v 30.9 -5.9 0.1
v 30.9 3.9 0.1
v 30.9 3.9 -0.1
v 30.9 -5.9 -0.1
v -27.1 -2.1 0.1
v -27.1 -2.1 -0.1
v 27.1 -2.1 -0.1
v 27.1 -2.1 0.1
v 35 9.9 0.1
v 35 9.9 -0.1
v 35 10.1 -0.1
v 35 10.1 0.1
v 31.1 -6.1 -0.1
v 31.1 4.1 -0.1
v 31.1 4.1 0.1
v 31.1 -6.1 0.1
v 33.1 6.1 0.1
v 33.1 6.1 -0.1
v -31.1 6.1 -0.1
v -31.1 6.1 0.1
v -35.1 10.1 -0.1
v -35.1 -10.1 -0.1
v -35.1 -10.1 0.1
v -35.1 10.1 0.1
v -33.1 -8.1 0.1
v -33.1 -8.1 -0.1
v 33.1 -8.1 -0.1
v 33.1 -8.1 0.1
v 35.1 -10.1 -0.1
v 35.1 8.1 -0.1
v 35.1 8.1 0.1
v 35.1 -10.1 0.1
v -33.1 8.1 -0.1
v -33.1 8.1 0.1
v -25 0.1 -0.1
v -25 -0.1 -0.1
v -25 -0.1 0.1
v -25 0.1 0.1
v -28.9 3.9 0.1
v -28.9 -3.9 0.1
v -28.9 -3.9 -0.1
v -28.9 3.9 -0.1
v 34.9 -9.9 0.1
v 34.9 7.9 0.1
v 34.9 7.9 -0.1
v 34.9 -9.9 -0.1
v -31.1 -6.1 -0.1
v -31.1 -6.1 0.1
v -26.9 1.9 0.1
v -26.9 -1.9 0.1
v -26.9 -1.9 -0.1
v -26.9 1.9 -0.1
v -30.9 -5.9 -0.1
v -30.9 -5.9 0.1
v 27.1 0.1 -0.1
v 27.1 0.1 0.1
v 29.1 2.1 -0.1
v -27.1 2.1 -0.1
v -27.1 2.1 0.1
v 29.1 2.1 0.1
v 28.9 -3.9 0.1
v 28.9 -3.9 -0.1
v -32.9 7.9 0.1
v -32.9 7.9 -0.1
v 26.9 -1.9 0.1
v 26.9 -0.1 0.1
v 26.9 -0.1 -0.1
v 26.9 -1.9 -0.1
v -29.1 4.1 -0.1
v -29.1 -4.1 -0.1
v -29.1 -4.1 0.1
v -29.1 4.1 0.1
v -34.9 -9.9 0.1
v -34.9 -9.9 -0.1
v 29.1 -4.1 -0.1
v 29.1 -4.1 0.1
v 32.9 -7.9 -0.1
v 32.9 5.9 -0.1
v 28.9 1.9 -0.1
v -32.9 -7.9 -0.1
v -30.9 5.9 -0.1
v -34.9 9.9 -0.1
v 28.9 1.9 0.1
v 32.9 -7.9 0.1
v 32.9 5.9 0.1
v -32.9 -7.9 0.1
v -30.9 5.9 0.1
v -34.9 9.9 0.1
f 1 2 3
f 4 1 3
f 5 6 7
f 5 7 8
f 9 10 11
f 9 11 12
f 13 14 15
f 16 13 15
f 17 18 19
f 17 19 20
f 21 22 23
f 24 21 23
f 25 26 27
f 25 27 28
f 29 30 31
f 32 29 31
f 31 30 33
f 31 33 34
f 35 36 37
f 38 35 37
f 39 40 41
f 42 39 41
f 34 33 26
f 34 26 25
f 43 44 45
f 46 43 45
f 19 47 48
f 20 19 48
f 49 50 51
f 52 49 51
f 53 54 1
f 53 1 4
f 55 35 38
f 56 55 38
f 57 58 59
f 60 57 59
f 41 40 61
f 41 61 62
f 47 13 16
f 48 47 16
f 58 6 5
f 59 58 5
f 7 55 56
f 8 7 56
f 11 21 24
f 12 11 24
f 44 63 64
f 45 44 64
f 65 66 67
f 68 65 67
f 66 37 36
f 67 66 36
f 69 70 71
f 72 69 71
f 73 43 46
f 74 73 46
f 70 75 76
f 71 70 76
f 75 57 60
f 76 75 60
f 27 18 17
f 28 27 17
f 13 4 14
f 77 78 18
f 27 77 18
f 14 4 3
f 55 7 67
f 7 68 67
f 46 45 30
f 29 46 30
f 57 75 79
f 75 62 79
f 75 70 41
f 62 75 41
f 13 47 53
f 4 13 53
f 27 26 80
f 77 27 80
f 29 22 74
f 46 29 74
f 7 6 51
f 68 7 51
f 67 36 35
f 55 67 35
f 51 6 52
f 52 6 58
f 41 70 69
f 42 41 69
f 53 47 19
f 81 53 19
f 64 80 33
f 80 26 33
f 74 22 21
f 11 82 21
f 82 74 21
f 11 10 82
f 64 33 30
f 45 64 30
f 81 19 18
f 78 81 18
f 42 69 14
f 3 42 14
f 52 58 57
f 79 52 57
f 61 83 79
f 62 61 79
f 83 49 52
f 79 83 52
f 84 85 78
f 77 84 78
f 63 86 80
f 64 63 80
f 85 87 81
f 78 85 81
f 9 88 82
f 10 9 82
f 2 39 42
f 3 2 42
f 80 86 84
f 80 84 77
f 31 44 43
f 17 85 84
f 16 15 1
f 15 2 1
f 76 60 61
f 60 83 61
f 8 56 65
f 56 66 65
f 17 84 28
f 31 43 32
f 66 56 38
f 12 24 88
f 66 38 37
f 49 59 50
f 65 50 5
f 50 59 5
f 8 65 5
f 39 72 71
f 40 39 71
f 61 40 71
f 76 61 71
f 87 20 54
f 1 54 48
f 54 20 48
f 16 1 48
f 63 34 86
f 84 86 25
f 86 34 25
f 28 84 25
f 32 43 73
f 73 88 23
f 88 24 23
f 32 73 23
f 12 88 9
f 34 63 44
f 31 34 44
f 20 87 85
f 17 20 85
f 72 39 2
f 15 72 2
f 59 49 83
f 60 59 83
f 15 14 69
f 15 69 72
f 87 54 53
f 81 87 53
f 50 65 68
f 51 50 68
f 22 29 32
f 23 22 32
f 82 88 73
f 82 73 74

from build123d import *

# Parameters (mm, degrees)
SKETCH4_W = 0.2
SKETCH4_H = 0.2


with BuildPart() as part:
    # Sweep2: sweep along a path in Sketch3
    with BuildLine(Plane.XY) as sweep2_path:
        Line((35, 10), (-35, 10))
        Line((-35, 10), (-35, -10))
        Line((-35, -10), (35, -10))
        Line((35, -10), (35, 8))
        Line((35, 8), (-33, 8))
        Line((-33, 8), (-33, -8))
        Line((-33, -8), (33, -8))
        Line((33, -8), (33, 6))
        Line((33, 6), (-31, 6))
        Line((-31, 6), (-31, -6))
        Line((-31, -6), (31, -6))
        Line((31, -6), (31, 4))
        Line((31, 4), (-29, 4))
        Line((-29, 4), (-29, -4))
        Line((-29, -4), (29, -4))
        Line((29, -4), (29, 2))
        Line((29, 2), (-27, 2))
        Line((-27, 2), (-27, -2))
        Line((-27, -2), (27, -2))
        Line((27, -2), (27, 0))
        Line((27, 0), (-25, 0))
    # Sketch4 → Sweep2 (sweep)
    with BuildSketch(Plane(origin=(0, 0, 0), x_dir=(0, 0, -1), z_dir=(1, 0, 0))):
        Rectangle(SKETCH4_W, SKETCH4_H)
    sweep(path=sweep2_path.line, transition=Transition.RIGHT)


solid = part.part
